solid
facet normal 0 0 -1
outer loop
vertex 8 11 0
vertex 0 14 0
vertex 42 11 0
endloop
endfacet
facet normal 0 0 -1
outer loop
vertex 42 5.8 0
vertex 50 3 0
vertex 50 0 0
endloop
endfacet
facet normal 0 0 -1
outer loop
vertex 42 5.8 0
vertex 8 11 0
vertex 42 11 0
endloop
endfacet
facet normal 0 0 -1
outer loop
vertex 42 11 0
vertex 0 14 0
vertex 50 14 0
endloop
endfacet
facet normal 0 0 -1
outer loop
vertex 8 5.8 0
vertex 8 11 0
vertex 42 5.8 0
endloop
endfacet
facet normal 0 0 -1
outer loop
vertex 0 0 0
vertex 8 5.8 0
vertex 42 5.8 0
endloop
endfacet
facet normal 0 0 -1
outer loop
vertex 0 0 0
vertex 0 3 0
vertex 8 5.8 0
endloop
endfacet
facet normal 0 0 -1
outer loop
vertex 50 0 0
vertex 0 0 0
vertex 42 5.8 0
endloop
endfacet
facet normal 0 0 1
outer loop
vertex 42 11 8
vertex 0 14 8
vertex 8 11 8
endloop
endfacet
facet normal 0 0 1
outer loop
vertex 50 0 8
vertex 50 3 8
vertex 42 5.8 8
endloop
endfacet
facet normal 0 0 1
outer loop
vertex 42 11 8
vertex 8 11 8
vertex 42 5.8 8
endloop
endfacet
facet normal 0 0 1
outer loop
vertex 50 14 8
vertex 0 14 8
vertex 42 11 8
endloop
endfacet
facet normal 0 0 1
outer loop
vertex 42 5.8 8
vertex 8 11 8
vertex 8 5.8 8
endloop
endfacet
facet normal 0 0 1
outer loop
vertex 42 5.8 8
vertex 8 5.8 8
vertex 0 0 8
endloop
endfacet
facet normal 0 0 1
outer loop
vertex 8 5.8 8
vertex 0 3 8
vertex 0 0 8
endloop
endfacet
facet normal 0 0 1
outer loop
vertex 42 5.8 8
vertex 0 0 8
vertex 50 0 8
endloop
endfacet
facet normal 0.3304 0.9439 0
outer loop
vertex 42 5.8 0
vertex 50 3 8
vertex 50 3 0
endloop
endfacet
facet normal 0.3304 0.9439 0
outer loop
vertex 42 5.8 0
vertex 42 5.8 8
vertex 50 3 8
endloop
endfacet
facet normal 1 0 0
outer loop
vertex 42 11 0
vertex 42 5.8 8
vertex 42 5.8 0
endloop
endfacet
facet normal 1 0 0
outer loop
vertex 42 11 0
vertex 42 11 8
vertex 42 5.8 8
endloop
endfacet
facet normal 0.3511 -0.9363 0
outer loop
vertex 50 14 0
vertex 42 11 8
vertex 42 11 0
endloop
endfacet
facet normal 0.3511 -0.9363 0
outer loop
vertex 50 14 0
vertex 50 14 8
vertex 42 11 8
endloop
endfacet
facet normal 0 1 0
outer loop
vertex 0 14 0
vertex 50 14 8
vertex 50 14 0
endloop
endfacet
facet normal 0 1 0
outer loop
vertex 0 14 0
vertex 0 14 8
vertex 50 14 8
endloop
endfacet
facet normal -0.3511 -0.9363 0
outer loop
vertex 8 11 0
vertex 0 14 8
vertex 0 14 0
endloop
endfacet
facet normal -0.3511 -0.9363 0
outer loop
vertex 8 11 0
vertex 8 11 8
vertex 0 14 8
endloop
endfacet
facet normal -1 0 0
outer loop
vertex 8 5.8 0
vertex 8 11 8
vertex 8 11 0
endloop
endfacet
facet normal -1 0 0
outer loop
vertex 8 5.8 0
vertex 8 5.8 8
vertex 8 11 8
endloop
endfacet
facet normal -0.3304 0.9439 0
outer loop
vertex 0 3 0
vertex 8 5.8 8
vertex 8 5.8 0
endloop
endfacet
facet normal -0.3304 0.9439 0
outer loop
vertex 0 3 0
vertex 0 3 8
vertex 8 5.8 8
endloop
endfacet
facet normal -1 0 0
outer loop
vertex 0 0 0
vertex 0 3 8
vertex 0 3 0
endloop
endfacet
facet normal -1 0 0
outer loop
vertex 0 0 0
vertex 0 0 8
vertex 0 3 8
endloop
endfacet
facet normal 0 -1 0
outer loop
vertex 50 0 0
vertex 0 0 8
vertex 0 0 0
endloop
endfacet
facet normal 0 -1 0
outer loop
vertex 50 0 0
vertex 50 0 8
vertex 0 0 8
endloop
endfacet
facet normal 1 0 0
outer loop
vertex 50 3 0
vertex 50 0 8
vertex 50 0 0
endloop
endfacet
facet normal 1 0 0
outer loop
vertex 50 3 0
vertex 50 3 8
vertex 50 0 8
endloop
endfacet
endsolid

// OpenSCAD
$fn = 32;

// ----------------------------------------------------------------------
// Key bar: dovetail key, 8 mm thick
// ----------------------------------------------------------------------

// --- parameters (mm) ---
profile_height = 8;       // extrusion height
profile_points = 10;      // points of the closed outline

profile = [[0, 0], [50, 0], [50, 3], [42, 5.8], [42, 11], [50, 14], [0, 14], [8, 11], [8, 5.8], [0, 3]];  // single closed polygon, 10 points, counter clockwise

// --- the one profile operation ---
linear_extrude(height = profile_height) polygon(points = profile);
